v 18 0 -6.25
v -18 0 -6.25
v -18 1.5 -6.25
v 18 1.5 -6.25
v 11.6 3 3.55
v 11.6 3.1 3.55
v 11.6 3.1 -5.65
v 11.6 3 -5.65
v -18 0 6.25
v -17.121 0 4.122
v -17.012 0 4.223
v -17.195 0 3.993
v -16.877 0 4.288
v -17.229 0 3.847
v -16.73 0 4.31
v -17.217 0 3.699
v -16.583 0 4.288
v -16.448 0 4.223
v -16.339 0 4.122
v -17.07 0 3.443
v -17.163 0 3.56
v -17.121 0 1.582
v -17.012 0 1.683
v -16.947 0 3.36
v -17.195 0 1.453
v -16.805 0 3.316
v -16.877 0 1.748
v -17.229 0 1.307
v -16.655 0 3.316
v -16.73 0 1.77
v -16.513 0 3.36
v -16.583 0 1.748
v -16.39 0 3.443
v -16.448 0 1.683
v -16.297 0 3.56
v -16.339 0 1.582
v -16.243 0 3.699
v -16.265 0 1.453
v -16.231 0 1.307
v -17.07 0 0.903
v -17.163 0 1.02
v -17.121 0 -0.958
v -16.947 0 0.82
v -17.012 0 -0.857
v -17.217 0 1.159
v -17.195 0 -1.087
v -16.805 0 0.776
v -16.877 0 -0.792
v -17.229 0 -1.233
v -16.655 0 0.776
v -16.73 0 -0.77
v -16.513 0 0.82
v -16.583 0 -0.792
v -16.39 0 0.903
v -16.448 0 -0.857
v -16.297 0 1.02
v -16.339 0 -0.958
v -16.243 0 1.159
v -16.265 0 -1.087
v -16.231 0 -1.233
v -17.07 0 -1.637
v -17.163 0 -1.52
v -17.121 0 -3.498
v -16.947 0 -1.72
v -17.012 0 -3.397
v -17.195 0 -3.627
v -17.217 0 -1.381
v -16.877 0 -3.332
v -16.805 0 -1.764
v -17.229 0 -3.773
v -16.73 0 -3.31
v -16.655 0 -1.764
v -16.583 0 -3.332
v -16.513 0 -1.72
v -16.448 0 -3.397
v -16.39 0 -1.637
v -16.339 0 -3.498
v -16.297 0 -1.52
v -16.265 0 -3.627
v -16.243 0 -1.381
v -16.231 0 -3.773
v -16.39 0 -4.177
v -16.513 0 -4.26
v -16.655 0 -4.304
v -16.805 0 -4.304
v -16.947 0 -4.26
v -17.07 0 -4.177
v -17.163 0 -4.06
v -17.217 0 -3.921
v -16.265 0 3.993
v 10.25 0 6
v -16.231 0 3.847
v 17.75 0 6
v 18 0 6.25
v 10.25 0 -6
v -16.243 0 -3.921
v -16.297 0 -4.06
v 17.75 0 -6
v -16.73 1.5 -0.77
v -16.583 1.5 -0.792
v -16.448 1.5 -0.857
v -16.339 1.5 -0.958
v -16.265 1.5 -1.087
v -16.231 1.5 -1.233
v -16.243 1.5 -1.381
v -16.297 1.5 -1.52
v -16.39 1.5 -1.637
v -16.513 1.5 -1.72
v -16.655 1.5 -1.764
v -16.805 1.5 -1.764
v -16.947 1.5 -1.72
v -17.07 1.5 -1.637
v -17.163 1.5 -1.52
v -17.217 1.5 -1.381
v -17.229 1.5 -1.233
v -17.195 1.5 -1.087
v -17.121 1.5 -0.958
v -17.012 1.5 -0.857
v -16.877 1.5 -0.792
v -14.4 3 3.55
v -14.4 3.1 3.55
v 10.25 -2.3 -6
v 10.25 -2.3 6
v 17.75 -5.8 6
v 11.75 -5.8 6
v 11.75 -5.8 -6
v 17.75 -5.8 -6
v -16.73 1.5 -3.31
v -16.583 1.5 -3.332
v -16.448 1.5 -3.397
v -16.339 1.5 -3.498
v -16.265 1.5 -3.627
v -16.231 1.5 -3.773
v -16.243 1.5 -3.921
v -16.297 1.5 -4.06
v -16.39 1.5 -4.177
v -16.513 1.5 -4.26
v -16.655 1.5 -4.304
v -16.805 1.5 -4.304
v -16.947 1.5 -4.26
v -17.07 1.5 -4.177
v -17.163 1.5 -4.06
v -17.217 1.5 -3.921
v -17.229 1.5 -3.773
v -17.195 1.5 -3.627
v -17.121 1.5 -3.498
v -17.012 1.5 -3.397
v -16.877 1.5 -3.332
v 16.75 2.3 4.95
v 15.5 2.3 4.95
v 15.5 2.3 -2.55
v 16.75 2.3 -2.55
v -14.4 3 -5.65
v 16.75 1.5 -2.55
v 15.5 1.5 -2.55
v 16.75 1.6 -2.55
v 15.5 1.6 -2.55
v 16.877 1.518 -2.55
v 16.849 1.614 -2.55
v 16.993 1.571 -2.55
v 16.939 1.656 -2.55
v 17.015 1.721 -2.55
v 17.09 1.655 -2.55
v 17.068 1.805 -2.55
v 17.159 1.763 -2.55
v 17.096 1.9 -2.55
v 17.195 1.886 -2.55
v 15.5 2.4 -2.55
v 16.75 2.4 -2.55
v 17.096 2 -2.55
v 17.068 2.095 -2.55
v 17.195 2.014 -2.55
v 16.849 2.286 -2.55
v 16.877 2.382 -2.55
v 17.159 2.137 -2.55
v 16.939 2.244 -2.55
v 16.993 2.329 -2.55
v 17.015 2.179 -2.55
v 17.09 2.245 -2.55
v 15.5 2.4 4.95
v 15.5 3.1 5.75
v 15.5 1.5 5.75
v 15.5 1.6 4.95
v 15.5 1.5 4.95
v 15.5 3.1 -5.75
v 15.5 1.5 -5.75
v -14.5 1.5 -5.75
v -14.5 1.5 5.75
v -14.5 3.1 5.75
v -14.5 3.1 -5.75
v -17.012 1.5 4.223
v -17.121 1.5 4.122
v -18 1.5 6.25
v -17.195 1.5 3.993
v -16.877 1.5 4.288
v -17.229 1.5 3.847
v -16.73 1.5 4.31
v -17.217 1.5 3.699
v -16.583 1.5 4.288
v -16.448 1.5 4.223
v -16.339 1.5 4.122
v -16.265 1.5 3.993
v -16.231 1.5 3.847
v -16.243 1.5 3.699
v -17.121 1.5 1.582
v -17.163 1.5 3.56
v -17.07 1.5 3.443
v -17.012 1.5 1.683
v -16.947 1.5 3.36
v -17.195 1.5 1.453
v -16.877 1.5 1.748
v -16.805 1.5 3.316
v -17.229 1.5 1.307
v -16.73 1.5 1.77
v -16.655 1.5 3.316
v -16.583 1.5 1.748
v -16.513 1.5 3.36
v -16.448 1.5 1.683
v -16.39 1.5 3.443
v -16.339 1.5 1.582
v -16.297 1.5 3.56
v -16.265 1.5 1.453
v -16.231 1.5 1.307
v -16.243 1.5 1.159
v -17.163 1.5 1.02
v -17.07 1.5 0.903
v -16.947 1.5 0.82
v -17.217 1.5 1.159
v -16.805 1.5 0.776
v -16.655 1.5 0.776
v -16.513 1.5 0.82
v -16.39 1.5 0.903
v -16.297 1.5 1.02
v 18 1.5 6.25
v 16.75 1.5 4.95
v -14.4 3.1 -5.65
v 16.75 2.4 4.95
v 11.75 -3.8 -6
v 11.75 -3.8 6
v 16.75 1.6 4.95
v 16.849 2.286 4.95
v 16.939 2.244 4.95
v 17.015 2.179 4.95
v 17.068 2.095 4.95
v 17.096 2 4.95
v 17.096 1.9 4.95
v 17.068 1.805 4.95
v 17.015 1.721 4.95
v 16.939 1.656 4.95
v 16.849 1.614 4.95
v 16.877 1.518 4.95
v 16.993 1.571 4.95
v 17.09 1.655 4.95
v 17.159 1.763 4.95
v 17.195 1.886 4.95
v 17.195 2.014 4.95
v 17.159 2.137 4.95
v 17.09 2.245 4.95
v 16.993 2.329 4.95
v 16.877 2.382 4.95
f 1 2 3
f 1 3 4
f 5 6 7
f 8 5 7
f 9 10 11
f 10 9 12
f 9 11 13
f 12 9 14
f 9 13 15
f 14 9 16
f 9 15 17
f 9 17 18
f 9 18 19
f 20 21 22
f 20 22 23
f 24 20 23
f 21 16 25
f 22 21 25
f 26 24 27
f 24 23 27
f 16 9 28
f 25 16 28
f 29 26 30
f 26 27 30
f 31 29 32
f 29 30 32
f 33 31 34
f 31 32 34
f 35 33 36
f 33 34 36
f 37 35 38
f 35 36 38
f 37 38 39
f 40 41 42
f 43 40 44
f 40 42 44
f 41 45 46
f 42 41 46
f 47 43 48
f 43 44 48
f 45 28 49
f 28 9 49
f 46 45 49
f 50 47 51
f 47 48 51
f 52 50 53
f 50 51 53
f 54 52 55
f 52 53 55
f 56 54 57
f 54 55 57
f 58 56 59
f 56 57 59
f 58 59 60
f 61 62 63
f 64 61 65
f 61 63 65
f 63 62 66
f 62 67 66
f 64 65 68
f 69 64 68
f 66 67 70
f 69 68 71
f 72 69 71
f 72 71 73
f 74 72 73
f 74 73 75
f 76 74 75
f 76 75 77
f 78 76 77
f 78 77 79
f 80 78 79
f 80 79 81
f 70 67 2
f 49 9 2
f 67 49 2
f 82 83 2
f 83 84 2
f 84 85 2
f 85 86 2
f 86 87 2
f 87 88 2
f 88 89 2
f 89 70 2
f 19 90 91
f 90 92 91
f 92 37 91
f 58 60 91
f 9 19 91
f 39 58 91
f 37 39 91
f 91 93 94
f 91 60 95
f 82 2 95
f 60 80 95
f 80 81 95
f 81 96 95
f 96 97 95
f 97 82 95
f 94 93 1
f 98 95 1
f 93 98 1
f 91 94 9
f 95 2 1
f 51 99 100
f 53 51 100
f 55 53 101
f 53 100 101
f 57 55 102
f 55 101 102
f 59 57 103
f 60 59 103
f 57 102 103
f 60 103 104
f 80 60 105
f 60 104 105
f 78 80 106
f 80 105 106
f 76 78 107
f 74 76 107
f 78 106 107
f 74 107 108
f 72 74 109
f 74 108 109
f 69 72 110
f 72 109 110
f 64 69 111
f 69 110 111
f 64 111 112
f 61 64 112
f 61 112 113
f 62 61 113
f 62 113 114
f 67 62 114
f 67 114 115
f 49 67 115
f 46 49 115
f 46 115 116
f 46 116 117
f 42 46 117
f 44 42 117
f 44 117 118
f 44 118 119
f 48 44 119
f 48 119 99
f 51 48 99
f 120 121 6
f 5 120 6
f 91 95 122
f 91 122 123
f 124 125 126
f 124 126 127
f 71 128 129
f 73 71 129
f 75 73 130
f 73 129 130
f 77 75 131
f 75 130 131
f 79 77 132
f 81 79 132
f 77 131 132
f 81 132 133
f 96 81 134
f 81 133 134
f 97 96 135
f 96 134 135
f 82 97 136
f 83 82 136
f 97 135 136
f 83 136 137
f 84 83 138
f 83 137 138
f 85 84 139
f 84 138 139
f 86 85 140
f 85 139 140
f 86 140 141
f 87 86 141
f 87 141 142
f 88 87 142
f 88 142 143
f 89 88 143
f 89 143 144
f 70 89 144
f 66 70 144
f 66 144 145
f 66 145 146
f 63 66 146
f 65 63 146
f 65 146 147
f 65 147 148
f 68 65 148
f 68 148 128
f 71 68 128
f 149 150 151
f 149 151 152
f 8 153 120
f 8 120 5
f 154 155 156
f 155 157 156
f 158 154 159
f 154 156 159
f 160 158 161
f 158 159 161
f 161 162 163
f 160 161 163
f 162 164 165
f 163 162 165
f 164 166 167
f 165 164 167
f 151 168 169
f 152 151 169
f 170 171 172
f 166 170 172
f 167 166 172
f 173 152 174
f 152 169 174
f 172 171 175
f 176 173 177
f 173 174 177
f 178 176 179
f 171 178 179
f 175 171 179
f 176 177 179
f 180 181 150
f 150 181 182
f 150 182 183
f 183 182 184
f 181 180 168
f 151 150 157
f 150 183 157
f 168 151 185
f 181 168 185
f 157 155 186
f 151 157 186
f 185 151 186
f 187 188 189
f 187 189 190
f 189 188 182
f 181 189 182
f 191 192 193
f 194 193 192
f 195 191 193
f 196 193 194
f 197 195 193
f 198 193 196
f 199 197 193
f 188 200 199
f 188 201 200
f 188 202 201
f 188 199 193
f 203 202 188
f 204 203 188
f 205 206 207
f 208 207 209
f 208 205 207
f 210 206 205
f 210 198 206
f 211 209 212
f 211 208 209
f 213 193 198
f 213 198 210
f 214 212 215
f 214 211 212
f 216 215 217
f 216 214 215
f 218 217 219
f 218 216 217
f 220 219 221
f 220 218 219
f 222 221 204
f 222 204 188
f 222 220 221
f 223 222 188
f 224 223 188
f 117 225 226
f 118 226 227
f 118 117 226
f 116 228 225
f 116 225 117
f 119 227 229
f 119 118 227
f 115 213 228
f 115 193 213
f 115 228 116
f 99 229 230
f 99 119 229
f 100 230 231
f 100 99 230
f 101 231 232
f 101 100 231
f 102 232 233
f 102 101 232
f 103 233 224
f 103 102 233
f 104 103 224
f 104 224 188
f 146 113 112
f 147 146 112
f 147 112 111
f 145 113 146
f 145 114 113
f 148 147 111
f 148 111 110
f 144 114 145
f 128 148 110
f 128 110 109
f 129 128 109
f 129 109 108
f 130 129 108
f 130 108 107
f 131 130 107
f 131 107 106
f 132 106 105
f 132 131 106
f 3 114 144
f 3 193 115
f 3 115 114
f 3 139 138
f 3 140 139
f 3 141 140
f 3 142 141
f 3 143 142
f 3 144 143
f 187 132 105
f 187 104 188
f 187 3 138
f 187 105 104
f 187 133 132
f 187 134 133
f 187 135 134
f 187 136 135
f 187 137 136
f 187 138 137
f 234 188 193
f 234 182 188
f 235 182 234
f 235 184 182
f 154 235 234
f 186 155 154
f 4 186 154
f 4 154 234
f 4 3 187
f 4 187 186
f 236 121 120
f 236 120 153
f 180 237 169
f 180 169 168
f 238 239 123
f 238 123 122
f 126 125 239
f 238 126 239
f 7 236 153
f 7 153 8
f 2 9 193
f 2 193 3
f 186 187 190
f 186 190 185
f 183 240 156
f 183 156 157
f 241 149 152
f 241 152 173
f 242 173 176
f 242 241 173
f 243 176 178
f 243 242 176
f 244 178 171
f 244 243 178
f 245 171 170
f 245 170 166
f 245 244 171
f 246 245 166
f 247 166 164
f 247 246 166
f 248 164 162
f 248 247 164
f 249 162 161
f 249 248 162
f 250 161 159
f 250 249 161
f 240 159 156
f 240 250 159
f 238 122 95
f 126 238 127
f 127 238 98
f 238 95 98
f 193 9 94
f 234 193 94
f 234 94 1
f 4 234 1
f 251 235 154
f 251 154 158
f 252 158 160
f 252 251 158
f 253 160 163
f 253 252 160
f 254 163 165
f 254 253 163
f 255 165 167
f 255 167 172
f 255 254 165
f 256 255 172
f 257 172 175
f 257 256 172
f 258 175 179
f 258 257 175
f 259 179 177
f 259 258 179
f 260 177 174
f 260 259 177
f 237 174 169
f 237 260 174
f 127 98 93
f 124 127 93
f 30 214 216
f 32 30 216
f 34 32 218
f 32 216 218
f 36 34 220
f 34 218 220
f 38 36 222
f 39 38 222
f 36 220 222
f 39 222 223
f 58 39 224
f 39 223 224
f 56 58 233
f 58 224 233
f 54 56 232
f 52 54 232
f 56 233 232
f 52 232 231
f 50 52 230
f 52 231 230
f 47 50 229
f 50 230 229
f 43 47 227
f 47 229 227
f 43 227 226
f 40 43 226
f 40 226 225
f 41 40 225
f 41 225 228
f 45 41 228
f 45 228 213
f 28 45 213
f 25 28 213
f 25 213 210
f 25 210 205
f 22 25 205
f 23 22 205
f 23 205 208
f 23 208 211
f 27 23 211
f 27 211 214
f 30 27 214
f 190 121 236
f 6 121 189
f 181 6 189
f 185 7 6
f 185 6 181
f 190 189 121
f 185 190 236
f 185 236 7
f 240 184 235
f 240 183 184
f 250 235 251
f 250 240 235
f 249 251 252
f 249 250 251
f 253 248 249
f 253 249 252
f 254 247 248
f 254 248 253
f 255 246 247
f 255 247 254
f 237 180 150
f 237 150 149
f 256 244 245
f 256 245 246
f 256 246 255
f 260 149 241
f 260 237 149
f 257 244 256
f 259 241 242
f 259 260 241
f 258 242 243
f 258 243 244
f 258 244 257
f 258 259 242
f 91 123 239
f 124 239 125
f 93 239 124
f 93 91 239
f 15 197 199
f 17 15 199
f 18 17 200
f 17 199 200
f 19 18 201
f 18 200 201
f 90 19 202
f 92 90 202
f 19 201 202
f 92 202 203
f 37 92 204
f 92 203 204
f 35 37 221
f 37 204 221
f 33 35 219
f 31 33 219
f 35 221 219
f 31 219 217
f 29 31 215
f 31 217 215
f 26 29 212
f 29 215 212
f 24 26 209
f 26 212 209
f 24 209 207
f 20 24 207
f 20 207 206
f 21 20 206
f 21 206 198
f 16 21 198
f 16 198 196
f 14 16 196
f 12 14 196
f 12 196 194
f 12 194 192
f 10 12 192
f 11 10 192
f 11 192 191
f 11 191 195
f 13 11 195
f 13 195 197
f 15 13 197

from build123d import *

# Parameters (mm, degrees)
SKETCH1_W           = 36
SKETCH1_H           = 12.5
BOSS_EXTRUDE1_DEPTH = 1.5
SKETCH2_R           = 0.5
CUT_EXTRUDE1_DEPTH  = 20.113149924
LPATTERN1_COUNT     = 4
LPATTERN1_PITCH     = 2.54
SKETCH3_W           = 7.5
SKETCH3_H           = 12
BOSS_EXTRUDE2_DEPTH = 5.8
SKETCH4_W           = 1.5
SKETCH4_H           = 2
CUT_EXTRUDE2_DEPTH  = 23.532254659
CHAMFER1_SIZE       = 1.5
SKETCH5_W           = 30
SKETCH5_H           = 11.5
BOSS_EXTRUDE3_DEPTH = 1.6
EXTRUDE_THIN1_START = -0.8
EXTRUDE_THIN1_DEPTH = 7.5
SKETCH7_W           = 26
SKETCH7_H           = 9.2
CUT_EXTRUDE3_DEPTH  = 0.1


with BuildPart() as part:
    # Sketch1 → Boss-Extrude1 (new body)
    with BuildSketch(Plane(origin=(0, 0, 0), x_dir=(1, 0, 0), z_dir=(0, 1, 0))):
        Rectangle(SKETCH1_W, SKETCH1_H)
    extrude(amount=BOSS_EXTRUDE1_DEPTH)

    # Sketch2 → Cut-Extrude1 (cut, through all)
    with BuildSketch(Plane(origin=(0, 1.5, 0), x_dir=(1, 0, 0), z_dir=(0, 1, 0))):
        with Locations(Location((-16.73, -3.81, 0), (0, 0, 270))):
            Circle(SKETCH2_R)
    cut_extrude1 = extrude(amount=-CUT_EXTRUDE1_DEPTH, mode=Mode.SUBTRACT)

    # LPattern1: Cut-Extrude1 ×4
    with Locations(*[(0, 0, -i * LPATTERN1_PITCH) for i in range(1, LPATTERN1_COUNT)]):
        add(cut_extrude1, mode=Mode.SUBTRACT)

    # Sketch3 → Boss-Extrude2 (add)
    with BuildSketch(Plane.XZ):
        with Locations((14, 0)):
            Rectangle(SKETCH3_W, SKETCH3_H)
    extrude(amount=BOSS_EXTRUDE2_DEPTH)

    # Sketch4 → Cut-Extrude2 (cut, through all)
    with BuildSketch(Plane.XY.offset(6)):
        with Locations((11, -4.8)):
            Rectangle(SKETCH4_W, SKETCH4_H)
    extrude(amount=-CUT_EXTRUDE2_DEPTH, mode=Mode.SUBTRACT)

    # Chamfer1
    chamfer1_edges = [part.edges().sort_by_distance(p)[0] for p in [
        (10.25, -3.8, 0),
    ]]
    chamfer(chamfer1_edges, length=CHAMFER1_SIZE - 0.0001)  # a hair under: the kernel refuses the full size

    # Sketch5 → Boss-Extrude3 (add)
    with BuildSketch(Plane(origin=(0, 1.5, 0), x_dir=(1, 0, 0), z_dir=(0, 1, 0))):
        with Locations((0.5, 0)):
            Rectangle(SKETCH5_W, SKETCH5_H)
    extrude(amount=BOSS_EXTRUDE3_DEPTH)

    # Sketch6 → Extrude-Thin1 (add)
    with BuildSketch(Plane.XY.offset(5.75).offset(EXTRUDE_THIN1_START)):
        with BuildLine():
            Line((15.5, 1.5), (16.75, 1.5))
            ThreePointArc((16.75, 1.5), (17.2, 1.95), (16.75, 2.4))
            Line((16.75, 2.4), (15.5, 2.4))
            Line((15.5, 2.4), (15.5, 2.3))
            Line((15.5, 2.3), (16.75, 2.3))
            ThreePointArc((16.75, 2.3), (17.1, 1.95), (16.75, 1.6))
            Line((16.75, 1.6), (15.5, 1.6))
            Line((15.5, 1.6), (15.5, 1.5))
        make_face()
    extrude(amount=-EXTRUDE_THIN1_DEPTH)

    # Sketch7 → Cut-Extrude3 (cut)
    with BuildSketch(Plane(origin=(0, 3.1, 0), x_dir=(1, 0, 0), z_dir=(0, 1, 0))):
        with Locations((-1.4, 1.05)):
            Rectangle(SKETCH7_W, SKETCH7_H)
    extrude(amount=-CUT_EXTRUDE3_DEPTH, mode=Mode.SUBTRACT)


solid = part.part
